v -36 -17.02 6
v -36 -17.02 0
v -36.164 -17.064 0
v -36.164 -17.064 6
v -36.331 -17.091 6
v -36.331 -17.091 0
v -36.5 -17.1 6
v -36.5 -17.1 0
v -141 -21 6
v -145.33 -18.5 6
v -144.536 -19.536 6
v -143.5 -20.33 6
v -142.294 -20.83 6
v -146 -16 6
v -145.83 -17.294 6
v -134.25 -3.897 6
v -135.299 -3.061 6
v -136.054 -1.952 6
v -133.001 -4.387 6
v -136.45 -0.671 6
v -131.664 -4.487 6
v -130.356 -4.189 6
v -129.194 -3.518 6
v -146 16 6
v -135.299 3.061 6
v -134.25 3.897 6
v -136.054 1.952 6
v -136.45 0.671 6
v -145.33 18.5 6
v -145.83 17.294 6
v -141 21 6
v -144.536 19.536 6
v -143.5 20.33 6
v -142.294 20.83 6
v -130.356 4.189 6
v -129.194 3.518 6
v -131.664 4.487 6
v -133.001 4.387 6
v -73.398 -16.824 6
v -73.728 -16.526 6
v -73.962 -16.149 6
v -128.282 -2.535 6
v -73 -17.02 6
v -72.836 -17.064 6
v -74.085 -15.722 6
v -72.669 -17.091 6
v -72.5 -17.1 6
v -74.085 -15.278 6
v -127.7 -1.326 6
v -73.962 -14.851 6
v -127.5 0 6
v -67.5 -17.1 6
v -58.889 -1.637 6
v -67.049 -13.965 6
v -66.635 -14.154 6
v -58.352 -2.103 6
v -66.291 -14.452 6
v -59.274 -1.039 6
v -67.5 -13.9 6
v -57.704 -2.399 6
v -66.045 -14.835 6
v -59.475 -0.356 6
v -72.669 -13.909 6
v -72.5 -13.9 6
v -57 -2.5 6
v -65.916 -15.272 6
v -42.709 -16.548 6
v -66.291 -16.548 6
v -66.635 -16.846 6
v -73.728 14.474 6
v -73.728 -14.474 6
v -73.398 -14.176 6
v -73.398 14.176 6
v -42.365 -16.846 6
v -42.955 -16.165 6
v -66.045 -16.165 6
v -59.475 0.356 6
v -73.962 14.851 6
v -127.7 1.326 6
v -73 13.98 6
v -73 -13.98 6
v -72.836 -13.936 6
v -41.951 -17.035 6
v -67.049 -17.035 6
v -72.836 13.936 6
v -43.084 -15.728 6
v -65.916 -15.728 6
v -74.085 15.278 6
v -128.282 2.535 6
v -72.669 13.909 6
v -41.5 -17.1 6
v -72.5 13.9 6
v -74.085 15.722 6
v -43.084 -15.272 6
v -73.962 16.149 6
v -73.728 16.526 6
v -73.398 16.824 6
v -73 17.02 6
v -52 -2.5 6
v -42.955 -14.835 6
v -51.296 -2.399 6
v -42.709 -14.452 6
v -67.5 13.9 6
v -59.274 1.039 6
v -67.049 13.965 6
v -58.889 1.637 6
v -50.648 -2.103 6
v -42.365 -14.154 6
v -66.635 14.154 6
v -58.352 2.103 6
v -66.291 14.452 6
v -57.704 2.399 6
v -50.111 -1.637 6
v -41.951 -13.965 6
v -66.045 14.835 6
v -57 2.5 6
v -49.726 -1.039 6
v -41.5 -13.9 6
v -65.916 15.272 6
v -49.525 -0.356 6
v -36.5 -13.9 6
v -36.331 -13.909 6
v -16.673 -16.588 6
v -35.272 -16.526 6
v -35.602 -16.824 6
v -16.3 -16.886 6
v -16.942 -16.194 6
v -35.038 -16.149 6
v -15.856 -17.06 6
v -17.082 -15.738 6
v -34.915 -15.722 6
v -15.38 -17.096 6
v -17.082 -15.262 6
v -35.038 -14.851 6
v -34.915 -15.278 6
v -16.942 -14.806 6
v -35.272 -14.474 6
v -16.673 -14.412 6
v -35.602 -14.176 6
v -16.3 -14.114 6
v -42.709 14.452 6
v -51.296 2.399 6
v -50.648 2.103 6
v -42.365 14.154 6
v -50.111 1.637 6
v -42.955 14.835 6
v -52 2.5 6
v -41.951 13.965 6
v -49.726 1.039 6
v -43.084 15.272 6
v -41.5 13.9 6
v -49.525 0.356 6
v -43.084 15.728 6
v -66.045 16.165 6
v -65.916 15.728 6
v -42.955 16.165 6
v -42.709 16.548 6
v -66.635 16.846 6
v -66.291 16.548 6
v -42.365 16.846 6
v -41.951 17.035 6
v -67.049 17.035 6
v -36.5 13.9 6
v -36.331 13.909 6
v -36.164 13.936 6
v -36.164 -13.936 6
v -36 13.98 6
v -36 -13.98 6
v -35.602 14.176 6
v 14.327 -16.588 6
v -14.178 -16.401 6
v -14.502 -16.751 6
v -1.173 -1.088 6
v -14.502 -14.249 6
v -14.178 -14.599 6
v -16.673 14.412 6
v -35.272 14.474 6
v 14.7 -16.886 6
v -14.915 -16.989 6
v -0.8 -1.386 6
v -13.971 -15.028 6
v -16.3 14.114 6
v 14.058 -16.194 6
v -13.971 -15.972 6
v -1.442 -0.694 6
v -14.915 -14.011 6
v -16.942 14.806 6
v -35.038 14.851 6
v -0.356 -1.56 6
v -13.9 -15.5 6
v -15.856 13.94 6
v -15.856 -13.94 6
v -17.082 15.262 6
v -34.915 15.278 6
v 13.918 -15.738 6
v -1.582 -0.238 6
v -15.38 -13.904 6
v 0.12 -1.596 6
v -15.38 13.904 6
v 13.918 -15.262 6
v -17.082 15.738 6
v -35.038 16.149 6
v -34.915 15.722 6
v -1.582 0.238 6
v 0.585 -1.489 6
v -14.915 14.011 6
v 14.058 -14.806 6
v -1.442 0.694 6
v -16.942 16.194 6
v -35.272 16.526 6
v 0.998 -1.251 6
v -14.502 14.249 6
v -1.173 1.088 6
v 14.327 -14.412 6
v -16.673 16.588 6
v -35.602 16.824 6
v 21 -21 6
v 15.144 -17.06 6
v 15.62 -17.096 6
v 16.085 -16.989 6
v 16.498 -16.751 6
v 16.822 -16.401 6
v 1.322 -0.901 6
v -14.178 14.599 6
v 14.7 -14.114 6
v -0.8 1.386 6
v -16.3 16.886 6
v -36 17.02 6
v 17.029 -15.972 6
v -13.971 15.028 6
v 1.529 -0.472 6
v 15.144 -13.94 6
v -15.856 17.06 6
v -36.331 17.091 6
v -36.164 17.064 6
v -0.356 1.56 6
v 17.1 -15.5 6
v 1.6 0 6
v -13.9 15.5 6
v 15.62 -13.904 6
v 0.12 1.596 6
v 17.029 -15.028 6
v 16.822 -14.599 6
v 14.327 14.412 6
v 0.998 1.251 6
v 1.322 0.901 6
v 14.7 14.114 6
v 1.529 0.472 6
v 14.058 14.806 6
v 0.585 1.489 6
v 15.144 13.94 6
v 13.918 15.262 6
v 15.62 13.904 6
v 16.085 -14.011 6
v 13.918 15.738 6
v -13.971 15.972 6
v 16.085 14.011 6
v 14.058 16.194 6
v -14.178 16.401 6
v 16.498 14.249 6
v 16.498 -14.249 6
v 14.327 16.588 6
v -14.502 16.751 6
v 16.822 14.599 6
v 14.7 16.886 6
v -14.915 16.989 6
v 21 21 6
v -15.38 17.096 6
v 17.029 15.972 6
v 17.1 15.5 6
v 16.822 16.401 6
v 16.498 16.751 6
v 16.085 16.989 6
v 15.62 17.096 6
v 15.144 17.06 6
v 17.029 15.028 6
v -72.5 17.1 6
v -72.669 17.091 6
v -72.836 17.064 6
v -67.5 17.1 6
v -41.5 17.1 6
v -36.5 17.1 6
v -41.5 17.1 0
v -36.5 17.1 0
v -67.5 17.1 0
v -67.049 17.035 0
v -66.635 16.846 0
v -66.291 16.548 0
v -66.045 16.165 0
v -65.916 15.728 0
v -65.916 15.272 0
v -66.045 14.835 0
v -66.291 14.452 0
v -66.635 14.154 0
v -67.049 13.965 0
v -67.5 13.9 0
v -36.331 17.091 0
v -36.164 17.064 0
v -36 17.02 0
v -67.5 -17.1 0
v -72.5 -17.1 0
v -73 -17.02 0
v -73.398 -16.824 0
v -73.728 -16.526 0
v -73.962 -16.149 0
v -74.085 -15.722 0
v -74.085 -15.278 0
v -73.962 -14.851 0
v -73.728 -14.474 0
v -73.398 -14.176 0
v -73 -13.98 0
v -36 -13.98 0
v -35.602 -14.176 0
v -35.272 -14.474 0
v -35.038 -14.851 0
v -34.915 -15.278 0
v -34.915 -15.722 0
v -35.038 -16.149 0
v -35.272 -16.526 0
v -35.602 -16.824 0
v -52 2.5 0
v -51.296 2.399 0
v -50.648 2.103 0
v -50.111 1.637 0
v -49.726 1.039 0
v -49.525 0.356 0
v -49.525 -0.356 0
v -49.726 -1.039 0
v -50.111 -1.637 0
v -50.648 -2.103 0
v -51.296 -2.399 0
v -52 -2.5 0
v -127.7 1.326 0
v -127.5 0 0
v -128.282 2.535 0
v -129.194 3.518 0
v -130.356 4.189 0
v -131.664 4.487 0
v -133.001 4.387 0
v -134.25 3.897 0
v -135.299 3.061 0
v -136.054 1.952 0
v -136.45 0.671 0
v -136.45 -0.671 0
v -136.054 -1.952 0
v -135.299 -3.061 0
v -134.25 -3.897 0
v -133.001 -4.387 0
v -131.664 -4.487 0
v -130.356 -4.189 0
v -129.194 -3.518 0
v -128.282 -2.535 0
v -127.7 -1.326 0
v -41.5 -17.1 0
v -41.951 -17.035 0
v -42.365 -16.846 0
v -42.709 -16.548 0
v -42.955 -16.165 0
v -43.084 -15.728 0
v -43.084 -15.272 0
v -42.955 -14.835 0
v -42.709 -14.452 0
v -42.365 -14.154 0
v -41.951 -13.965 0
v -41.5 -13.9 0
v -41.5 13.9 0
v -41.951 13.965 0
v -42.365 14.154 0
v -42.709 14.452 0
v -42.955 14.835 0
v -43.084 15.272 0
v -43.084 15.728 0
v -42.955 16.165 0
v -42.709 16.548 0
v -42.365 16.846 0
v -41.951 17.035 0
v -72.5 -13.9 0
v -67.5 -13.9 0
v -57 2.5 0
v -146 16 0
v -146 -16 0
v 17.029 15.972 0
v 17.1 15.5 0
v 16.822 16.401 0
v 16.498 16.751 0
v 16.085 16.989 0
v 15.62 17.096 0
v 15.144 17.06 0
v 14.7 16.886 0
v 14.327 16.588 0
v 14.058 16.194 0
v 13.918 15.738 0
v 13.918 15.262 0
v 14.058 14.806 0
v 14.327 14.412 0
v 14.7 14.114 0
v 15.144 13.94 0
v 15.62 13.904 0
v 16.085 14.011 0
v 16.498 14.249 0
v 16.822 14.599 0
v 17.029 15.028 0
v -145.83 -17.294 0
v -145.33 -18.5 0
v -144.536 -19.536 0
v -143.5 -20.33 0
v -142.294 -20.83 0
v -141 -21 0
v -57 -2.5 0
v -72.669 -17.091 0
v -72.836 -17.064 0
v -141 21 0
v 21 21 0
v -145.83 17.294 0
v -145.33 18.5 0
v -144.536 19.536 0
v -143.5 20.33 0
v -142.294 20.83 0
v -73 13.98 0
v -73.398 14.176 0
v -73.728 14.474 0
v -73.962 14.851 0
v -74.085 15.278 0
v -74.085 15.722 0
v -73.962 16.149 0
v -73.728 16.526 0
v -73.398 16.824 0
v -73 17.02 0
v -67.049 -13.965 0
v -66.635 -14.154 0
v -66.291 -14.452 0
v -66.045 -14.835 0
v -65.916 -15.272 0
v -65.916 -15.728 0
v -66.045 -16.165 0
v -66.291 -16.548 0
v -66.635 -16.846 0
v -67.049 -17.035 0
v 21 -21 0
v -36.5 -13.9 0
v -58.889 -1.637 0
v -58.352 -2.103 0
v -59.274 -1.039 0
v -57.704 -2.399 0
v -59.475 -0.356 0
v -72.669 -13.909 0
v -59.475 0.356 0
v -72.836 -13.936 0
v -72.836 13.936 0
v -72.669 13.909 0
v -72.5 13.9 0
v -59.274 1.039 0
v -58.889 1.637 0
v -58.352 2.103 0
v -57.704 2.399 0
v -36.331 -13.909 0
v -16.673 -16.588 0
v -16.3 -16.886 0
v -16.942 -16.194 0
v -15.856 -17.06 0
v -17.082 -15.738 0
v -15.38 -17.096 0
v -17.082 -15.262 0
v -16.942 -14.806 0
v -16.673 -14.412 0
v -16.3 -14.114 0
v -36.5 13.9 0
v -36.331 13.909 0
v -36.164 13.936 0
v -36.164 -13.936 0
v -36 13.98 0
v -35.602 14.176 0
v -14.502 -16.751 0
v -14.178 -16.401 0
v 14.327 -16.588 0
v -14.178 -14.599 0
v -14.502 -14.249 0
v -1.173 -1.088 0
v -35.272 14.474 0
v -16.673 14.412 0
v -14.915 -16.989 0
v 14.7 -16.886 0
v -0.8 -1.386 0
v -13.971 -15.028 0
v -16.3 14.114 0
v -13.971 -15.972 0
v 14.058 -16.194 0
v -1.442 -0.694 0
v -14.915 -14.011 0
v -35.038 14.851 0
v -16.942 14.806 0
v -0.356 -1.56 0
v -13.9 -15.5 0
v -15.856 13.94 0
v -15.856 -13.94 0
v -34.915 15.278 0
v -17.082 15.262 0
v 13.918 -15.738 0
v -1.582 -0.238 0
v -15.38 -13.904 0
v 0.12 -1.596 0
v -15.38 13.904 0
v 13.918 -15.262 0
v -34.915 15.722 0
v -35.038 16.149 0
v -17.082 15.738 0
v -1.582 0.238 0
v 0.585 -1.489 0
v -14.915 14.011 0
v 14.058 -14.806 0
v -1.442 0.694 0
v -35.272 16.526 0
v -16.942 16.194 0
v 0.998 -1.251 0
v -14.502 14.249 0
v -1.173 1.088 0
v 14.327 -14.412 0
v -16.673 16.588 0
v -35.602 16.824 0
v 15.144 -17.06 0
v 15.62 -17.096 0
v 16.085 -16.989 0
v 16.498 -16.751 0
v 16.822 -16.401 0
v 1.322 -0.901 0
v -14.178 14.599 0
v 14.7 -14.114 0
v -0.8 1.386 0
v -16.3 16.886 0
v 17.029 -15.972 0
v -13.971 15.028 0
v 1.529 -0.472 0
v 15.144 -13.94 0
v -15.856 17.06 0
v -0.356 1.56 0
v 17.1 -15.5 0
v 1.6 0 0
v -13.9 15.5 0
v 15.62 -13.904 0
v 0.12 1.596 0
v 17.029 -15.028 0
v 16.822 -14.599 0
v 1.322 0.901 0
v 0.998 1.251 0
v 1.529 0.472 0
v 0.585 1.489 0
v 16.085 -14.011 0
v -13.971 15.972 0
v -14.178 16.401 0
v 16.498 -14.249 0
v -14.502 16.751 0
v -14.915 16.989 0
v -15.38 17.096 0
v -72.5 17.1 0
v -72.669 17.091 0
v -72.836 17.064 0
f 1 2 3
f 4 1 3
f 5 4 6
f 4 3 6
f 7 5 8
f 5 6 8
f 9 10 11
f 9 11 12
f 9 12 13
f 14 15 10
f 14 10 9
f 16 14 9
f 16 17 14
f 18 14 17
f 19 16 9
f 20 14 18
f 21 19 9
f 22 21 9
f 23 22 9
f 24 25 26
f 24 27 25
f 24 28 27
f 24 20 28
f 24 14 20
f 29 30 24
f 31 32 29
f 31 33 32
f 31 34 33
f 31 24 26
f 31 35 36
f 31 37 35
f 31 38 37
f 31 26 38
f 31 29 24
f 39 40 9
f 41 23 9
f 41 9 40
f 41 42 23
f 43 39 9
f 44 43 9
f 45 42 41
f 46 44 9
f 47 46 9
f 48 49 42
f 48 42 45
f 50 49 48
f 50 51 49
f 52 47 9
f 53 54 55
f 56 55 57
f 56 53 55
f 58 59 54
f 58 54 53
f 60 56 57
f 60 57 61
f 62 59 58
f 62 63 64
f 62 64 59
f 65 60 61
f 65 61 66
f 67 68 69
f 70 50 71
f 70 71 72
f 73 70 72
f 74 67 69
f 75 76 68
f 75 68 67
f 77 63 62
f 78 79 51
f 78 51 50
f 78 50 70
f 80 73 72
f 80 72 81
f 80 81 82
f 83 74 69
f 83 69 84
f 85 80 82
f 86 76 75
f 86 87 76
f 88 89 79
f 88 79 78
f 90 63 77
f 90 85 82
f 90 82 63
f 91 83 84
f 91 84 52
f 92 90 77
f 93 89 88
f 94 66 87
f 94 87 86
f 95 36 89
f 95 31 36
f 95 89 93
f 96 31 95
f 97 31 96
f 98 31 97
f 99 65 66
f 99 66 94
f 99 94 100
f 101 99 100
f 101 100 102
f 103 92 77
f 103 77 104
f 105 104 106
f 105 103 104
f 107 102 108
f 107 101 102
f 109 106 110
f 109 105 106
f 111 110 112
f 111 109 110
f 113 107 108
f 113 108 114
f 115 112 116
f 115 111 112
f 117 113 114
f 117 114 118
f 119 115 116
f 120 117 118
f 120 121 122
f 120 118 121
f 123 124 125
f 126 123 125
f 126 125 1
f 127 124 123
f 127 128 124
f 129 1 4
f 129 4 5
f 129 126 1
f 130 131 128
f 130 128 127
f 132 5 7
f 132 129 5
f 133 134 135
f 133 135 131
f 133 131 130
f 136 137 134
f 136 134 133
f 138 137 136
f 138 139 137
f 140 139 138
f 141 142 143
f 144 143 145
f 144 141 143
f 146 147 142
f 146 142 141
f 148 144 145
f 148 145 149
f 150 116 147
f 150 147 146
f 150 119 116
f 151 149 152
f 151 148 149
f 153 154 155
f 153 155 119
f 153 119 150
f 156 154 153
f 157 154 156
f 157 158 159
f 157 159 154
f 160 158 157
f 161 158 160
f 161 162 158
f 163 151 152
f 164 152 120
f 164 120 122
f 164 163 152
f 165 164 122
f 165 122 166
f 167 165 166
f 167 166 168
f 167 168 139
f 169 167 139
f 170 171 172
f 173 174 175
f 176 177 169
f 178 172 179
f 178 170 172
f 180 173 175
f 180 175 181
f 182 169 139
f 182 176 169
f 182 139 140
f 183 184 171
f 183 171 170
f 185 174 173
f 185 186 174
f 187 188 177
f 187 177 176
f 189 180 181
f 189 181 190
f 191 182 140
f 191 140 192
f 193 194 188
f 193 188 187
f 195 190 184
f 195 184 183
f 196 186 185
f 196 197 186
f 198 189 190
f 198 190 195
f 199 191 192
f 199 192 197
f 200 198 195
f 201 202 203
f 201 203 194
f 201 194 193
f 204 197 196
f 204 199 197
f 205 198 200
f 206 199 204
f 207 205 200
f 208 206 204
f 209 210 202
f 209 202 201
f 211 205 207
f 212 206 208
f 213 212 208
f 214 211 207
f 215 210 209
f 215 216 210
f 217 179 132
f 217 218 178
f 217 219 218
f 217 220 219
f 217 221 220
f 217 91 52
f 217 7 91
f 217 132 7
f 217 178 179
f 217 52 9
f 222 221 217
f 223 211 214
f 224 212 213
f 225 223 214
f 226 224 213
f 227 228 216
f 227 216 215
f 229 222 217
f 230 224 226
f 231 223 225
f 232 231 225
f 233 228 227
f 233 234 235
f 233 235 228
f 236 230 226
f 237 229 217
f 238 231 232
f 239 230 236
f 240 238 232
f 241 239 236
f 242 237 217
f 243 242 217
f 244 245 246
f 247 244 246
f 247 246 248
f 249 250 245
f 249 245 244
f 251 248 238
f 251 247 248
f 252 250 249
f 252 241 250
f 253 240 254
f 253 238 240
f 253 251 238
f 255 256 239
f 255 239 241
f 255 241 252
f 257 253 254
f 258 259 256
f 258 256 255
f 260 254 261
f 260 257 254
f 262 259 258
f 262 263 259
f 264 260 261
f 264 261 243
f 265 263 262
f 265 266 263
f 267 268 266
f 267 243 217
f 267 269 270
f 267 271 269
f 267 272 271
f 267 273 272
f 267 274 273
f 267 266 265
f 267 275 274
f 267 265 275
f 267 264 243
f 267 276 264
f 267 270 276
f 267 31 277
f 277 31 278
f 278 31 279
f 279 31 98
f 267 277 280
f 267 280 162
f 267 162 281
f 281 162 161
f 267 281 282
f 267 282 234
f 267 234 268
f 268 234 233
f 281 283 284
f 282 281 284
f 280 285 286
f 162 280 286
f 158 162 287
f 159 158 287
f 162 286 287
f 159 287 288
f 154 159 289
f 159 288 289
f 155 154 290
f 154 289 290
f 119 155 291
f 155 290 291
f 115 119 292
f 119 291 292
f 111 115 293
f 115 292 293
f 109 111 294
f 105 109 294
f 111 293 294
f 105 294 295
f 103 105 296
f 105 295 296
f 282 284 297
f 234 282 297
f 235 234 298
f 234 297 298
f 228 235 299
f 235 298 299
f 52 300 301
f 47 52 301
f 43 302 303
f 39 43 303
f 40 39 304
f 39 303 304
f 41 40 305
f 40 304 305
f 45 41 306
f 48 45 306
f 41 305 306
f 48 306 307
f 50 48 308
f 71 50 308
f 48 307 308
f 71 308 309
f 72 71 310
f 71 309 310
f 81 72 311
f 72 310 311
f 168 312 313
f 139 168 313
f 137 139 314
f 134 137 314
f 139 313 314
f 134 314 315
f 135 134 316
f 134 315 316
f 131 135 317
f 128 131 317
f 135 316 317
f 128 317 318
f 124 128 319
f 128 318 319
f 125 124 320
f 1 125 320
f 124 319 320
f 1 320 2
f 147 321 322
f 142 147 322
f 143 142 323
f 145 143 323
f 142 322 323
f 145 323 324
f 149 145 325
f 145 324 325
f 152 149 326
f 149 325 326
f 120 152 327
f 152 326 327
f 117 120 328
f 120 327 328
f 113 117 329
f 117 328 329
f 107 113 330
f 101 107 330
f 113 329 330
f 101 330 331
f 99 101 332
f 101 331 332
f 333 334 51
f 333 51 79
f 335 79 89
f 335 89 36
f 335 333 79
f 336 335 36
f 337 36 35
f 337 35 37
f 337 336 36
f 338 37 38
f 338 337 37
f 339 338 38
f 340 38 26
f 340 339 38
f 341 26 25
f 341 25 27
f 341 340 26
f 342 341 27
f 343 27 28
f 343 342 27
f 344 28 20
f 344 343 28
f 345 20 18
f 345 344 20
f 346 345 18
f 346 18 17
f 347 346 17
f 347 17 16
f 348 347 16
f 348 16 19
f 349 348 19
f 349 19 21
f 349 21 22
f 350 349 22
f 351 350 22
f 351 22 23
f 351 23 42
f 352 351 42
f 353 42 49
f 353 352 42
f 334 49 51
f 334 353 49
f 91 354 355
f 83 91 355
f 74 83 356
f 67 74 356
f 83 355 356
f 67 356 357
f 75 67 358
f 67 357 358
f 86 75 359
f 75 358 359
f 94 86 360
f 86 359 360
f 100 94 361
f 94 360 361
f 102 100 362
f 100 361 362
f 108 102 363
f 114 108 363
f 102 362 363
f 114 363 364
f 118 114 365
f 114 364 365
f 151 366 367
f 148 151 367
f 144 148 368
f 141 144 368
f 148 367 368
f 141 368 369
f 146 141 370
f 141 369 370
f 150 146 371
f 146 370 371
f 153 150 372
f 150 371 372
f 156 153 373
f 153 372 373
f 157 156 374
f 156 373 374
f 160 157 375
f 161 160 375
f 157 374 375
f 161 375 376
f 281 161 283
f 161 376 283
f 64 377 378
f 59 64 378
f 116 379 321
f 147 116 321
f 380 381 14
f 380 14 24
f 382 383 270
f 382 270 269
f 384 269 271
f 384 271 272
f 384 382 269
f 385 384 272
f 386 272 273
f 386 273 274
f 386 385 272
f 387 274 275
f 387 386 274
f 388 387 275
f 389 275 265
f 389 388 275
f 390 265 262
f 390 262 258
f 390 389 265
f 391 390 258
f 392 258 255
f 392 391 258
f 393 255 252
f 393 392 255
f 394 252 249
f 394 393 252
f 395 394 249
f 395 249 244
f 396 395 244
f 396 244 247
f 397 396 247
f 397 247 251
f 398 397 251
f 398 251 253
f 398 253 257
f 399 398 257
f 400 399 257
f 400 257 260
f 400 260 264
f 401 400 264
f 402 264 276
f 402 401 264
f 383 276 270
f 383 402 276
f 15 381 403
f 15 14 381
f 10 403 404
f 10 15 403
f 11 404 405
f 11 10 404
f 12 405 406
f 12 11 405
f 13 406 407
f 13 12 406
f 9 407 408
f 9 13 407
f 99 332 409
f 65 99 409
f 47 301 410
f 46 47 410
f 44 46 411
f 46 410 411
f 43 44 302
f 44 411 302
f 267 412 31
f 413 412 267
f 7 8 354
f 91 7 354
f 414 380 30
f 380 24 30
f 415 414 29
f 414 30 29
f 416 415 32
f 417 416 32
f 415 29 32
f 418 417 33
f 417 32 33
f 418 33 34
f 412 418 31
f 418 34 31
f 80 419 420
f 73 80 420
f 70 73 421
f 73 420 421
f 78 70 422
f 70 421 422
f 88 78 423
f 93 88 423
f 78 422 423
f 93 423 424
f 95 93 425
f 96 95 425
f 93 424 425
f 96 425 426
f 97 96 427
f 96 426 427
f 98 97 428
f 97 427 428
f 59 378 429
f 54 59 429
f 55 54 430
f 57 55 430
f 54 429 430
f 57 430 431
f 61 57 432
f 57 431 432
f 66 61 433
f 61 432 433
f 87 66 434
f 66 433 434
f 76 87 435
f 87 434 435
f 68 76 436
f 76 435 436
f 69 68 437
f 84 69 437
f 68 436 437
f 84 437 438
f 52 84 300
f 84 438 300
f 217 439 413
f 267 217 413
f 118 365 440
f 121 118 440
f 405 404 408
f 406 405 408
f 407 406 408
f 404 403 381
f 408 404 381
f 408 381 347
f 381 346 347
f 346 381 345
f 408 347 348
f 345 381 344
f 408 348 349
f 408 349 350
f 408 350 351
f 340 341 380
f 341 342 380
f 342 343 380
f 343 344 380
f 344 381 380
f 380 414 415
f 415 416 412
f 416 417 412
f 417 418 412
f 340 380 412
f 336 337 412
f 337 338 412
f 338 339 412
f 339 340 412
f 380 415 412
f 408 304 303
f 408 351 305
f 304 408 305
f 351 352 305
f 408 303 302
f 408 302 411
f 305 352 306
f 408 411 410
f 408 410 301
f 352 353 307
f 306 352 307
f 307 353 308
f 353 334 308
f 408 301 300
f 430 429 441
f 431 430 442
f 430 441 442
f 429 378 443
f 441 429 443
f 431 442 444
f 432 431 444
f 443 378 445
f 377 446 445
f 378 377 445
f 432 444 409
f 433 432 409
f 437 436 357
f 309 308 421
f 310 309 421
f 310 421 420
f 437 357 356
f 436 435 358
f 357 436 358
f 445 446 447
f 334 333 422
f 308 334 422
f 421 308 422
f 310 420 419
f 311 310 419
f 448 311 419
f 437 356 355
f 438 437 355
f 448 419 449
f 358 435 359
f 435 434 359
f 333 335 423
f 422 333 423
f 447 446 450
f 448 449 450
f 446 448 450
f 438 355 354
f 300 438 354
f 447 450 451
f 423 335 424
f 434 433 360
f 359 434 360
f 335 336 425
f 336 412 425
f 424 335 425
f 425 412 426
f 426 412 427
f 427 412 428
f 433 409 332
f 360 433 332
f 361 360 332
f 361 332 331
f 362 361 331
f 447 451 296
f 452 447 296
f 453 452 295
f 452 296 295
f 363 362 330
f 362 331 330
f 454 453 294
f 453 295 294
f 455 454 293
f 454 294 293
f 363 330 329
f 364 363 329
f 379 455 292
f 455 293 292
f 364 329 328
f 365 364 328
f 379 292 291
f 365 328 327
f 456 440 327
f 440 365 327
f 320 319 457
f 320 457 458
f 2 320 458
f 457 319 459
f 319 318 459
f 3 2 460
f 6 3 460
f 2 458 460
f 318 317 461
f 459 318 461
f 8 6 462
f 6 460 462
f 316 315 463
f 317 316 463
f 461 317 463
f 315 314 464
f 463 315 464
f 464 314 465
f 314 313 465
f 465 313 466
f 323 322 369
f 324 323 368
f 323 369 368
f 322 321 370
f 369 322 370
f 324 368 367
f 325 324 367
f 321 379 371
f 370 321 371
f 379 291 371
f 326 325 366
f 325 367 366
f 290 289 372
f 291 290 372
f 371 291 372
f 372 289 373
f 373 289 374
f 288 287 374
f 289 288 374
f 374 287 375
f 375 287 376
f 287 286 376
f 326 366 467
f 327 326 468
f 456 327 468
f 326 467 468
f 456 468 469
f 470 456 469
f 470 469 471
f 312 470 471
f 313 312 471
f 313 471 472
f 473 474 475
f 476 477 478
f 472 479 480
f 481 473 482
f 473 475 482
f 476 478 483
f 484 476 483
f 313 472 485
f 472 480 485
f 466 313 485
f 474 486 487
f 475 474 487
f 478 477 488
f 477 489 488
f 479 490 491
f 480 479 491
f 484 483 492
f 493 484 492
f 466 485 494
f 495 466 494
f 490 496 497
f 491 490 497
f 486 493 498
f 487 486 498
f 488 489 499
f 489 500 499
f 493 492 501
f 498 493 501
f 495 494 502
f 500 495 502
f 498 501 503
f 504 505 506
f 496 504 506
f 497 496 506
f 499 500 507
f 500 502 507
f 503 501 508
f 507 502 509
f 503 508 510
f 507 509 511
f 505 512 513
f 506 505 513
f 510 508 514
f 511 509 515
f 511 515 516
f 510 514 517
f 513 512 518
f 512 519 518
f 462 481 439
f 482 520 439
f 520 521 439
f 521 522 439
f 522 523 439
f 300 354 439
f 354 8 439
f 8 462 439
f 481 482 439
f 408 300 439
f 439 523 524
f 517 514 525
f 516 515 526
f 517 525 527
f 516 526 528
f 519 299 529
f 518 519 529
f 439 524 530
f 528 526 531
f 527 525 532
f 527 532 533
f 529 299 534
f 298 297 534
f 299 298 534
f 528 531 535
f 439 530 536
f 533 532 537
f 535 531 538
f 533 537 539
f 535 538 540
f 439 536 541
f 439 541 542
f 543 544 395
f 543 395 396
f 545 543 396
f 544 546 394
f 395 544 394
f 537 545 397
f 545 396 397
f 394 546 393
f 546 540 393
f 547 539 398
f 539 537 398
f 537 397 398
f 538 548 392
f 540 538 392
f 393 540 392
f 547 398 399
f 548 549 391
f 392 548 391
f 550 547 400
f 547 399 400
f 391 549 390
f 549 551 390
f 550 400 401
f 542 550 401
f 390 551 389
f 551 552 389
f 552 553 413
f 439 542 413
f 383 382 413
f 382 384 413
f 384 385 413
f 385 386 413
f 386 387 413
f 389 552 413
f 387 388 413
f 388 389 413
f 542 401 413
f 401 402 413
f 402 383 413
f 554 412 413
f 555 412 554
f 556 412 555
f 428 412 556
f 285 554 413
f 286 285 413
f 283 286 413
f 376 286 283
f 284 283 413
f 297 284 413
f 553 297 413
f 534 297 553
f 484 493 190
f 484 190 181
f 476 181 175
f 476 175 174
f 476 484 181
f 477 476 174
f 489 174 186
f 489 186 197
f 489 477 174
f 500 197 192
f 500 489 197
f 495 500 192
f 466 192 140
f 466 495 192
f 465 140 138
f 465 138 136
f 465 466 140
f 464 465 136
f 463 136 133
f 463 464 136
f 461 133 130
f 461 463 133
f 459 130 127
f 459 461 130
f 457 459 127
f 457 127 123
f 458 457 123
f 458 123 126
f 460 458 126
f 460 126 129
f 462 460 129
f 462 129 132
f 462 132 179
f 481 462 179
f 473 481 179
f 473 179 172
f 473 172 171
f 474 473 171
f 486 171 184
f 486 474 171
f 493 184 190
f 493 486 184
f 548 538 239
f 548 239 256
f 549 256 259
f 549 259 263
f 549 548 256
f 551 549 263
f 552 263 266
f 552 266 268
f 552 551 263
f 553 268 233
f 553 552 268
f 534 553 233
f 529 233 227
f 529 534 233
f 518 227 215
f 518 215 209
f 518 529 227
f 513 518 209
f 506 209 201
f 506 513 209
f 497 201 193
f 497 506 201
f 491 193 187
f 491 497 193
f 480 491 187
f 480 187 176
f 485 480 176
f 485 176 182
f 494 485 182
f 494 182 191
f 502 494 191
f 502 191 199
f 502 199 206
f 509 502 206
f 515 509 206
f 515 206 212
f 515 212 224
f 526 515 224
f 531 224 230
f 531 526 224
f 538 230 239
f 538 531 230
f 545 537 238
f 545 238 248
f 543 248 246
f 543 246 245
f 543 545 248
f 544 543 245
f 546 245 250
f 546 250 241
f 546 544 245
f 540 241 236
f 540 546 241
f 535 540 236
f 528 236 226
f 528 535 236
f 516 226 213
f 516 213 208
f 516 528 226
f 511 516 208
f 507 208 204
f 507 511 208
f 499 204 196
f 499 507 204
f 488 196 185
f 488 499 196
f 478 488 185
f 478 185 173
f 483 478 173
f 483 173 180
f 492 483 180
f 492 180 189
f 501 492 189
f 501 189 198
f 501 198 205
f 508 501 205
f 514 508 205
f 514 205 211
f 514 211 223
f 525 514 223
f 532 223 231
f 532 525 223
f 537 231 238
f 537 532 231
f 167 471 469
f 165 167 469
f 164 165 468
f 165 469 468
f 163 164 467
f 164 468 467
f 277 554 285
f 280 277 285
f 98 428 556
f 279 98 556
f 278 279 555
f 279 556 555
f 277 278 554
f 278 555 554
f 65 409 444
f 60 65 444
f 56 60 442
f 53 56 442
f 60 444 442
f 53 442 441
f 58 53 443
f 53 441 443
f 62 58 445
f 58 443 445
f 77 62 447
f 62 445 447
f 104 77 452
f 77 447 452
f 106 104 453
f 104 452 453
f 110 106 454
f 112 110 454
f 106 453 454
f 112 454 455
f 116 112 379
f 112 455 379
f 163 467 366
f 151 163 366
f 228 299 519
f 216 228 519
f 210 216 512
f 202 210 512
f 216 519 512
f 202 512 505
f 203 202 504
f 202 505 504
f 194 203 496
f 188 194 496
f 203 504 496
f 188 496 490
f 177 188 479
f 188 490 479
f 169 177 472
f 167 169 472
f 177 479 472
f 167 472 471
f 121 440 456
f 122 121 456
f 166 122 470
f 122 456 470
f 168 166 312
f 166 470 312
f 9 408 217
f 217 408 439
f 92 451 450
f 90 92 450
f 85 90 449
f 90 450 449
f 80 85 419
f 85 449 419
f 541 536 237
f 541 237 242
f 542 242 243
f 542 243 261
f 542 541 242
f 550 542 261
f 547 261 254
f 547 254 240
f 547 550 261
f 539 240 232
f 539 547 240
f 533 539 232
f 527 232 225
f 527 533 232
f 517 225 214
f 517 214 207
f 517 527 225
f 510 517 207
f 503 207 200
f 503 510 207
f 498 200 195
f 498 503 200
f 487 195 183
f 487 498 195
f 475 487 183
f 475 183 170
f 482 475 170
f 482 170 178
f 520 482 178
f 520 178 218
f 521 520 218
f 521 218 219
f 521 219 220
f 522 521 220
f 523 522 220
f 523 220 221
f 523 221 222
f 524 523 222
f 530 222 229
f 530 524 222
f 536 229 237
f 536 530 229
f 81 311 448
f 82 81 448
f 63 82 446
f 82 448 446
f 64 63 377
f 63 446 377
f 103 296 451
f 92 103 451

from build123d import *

# Parameters (mm, degrees)
SKETCH_1_W      = 63
SKETCH_1_H      = 42
SKETCH_1_R      = 4.5
SKETCH_1_W_2    = 10
SKETCH_1_W_3    = 42
SKETCH_1_R_2    = 1.6
SKETCH_1_W_4    = 5
EXTRUDE_1_DEPTH = 6
FILLET_1_R      = 5


with BuildPart() as part:
    # 草图1 → 凸台-拉伸1 (new body)
    # profile 1 of 7: a face of its own
    with BuildSketch(Plane.XY):
        with Locations((-109.5, 0)):
            Rectangle(SKETCH_1_W, SKETCH_1_H)
        with Locations((-132, 0)):
            Circle(SKETCH_1_R, mode=Mode.SUBTRACT)
    # profile 2 of 7: a face of its own
    with BuildSketch(Plane.XY):
        with BuildLine():
            Line((-73, 21), (-78, 21))
            Line((-78, 21), (-78, -21))
            Line((-78, -21), (-73, -21))
            Line((-73, -21), (-73, -17.019868415))
            ThreePointArc((-73, -17.019868415), (-74.1, -15.5), (-73, -13.980131585))
            Line((-73, -13.980131585), (-73, 13.980131585))
            ThreePointArc((-73, 13.980131585), (-74.1, 15.5), (-73, 17.019868415))
            Line((-73, 17.019868415), (-73, 21))
        make_face()
    # profile 3 of 7: a face of its own
    with BuildSketch(Plane.XY):
        with BuildLine():
            Line((-36, 21), (-73, 21))
            Line((-73, 21), (-73, 17.019868415))
            ThreePointArc((-73, 17.019868415), (-72.753190181, 17.079840097), (-72.5, 17.1))
            Line((-72.5, 17.1), (-67.5, 17.1))
            ThreePointArc((-67.5, 17.1), (-65.9, 15.5), (-67.5, 13.9))
            Line((-67.5, 13.9), (-72.5, 13.9))
            ThreePointArc((-72.5, 13.9), (-72.753190181, 13.920159903), (-73, 13.980131585))
            Line((-73, 13.980131585), (-73, -13.980131585))
            ThreePointArc((-73, -13.980131585), (-72.753190181, -13.920159903), (-72.5, -13.9))
            Line((-72.5, -13.9), (-67.5, -13.9))
            ThreePointArc((-67.5, -13.9), (-65.9, -15.5), (-67.5, -17.1))
            Line((-67.5, -17.1), (-72.5, -17.1))
            ThreePointArc((-72.5, -17.1), (-72.753190181, -17.079840097), (-73, -17.019868415))
            Line((-73, -17.019868415), (-73, -21))
            Line((-73, -21), (-36, -21))
            Line((-36, -21), (-36, -17.019868415))
            ThreePointArc((-36, -17.019868415), (-36.246809819, -17.079840097), (-36.5, -17.1))
            Line((-36.5, -17.1), (-41.5, -17.1))
            ThreePointArc((-41.5, -17.1), (-43.1, -15.5), (-41.5, -13.9))
            Line((-41.5, -13.9), (-36.5, -13.9))
            ThreePointArc((-36.5, -13.9), (-36.246809819, -13.920159903), (-36, -13.980131585))
            Line((-36, -13.980131585), (-36, 13.980131585))
            ThreePointArc((-36, 13.980131585), (-36.246809819, 13.920159903), (-36.5, 13.9))
            Line((-36.5, 13.9), (-41.5, 13.9))
            ThreePointArc((-41.5, 13.9), (-43.1, 15.5), (-41.5, 17.1))
            Line((-41.5, 17.1), (-36.5, 17.1))
            ThreePointArc((-36.5, 17.1), (-36.246809819, 17.079840097), (-36, 17.019868415))
            Line((-36, 17.019868415), (-36, 21))
        make_face()
        with BuildLine():
            ThreePointArc((-57, -2.5), (-59.5, 0), (-57, 2.5))
            Line((-57, 2.5), (-52, 2.5))
            ThreePointArc((-52, 2.5), (-49.5, 0), (-52, -2.5))
            Line((-52, -2.5), (-57, -2.5))
        make_face(mode=Mode.SUBTRACT)
    # profile 4 of 7: a face of its own
    with BuildSketch(Plane.XY):
        with BuildLine():
            Line((-31, 21), (-36, 21))
            Line((-36, 21), (-36, 17.019868415))
            ThreePointArc((-36, 17.019868415), (-34.9, 15.5), (-36, 13.980131585))
            Line((-36, 13.980131585), (-36, -13.980131585))
            ThreePointArc((-36, -13.980131585), (-34.9, -15.5), (-36, -17.019868415))
            Line((-36, -17.019868415), (-36, -21))
            Line((-36, -21), (-31, -21))
            Line((-31, -21), (-31, 21))
        make_face()
    # profile 5 of 7: a face of its own
    with BuildSketch(Plane.XY):
        with Locations((-26, 0)):
            Rectangle(SKETCH_1_W_2, SKETCH_1_H)
    # profile 6 of 7: a face of its own
    with BuildSketch(Plane.XY):
        Rectangle(SKETCH_1_W_3, SKETCH_1_H)
        with Locations((15.5, -15.5)):
            Circle(SKETCH_1_R_2, mode=Mode.SUBTRACT)
        with Locations((-15.5, -15.5)):
            Circle(SKETCH_1_R_2, mode=Mode.SUBTRACT)
        with Locations((15.5, 15.5)):
            Circle(SKETCH_1_R_2, mode=Mode.SUBTRACT)
        with Locations((-15.5, 15.5)):
            Circle(SKETCH_1_R_2, mode=Mode.SUBTRACT)
        Circle(SKETCH_1_R_2, mode=Mode.SUBTRACT)
    # profile 7 of 7: a face of its own
    with BuildSketch(Plane.XY):
        with Locations((-143.5, 0)):
            Rectangle(SKETCH_1_W_4, SKETCH_1_H)
    extrude(amount=EXTRUDE_1_DEPTH)

    # 圆角1
    fillet_1_edges = [part.edges().sort_by_distance(p)[0] for p in [
        (-146, 21, 3),
        (-146, -21, 3),
    ]]
    fillet(fillet_1_edges, radius=FILLET_1_R)


solid = part.part
